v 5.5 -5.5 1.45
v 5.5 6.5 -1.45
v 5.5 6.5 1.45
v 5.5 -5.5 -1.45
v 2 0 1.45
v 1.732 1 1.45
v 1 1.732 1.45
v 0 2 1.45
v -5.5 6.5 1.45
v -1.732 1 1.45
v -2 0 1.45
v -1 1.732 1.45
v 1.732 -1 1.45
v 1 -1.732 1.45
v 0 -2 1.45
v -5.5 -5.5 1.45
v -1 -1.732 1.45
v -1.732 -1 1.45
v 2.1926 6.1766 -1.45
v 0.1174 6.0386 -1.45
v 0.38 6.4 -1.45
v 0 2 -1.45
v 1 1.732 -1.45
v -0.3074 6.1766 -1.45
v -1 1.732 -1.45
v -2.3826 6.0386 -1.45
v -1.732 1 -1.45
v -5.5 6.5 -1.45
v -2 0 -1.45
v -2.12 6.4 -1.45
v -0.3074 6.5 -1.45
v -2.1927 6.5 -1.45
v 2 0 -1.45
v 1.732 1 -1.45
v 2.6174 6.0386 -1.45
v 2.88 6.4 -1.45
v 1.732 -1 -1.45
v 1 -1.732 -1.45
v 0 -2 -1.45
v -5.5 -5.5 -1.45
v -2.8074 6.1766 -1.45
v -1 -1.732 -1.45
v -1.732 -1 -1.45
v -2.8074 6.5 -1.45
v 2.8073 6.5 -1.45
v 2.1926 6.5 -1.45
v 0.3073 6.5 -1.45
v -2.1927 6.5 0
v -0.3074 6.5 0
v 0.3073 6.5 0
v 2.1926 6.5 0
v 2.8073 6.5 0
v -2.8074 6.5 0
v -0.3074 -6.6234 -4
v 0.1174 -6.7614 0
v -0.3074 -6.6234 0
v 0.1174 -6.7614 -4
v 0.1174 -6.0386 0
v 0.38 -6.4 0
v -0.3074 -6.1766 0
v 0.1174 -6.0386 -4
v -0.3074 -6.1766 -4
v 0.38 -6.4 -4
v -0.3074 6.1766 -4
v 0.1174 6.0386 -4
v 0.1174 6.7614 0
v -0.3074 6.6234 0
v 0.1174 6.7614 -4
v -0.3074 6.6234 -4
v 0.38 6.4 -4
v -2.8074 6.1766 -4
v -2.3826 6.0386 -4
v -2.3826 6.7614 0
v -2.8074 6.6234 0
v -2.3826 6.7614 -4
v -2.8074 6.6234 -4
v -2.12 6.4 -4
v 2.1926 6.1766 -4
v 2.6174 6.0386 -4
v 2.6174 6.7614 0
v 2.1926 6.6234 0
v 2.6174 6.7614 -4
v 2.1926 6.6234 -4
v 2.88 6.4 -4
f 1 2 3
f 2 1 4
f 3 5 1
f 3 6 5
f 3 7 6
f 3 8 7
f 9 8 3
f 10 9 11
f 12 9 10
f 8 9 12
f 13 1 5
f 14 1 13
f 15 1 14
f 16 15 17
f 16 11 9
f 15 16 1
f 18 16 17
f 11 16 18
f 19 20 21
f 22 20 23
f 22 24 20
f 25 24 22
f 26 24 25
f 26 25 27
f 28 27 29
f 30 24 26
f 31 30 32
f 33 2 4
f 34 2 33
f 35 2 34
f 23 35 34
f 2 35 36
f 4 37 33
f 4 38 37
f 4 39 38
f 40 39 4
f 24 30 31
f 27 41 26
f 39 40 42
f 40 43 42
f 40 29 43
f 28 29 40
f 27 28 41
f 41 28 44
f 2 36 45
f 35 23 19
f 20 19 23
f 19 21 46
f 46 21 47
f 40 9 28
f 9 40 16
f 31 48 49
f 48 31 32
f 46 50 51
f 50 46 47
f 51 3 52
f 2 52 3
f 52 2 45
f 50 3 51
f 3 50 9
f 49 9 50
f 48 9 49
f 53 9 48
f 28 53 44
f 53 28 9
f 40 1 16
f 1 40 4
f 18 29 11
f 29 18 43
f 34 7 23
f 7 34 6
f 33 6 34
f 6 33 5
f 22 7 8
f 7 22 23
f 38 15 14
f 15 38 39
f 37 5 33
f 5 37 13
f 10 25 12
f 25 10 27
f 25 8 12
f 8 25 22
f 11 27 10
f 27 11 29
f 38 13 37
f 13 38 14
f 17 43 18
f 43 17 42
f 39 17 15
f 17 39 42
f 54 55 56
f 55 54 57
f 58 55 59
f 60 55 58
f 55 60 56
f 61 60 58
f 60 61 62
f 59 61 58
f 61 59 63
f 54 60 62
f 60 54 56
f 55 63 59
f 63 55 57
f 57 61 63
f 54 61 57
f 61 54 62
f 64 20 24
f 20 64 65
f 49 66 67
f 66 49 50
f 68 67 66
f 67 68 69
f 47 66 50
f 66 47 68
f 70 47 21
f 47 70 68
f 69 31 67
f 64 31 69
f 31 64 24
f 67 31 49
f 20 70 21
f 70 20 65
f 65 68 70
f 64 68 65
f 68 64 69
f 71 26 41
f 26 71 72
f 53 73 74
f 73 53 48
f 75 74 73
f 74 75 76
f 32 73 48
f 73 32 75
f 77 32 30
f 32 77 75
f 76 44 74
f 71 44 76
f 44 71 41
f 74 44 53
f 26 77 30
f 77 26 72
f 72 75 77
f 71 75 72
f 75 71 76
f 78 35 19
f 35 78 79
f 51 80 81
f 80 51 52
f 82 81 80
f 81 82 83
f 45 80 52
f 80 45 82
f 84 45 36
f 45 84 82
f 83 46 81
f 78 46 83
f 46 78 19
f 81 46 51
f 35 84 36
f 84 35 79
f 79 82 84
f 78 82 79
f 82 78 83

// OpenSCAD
/*
 * Written by Dermot Tynan, Kalopa Research.
 * GPLv2.
 *
 * Outline of 3382H-1-252 rotary sensor.
 *
 * All dimensions are in mm.
 */
module rotary_sensor()
{
	union() {
		/* Pot */
		difference() {
			translate([0, 0.5, 0])
				cube([11, 12, 2.9], center = true);
			cylinder(r = 2, h = 3, center = true, $fn = 12);
		}
		/* Pins */
		translate([0, -6.4, -2.0]) 
			cylinder(r = 0.38, h = 4, center = true);
		translate([0, 6.4, -2.0]) 
			cylinder(r = 0.38, h = 4, center = true);
		translate([-2.5, 6.4, -2.0]) 
			cylinder(r = 0.38, h = 4, center = true);
		translate([2.5, 6.4, -2.0]) 
			cylinder(r = 0.38, h = 4, center = true);
	}
}

rotary_sensor();
